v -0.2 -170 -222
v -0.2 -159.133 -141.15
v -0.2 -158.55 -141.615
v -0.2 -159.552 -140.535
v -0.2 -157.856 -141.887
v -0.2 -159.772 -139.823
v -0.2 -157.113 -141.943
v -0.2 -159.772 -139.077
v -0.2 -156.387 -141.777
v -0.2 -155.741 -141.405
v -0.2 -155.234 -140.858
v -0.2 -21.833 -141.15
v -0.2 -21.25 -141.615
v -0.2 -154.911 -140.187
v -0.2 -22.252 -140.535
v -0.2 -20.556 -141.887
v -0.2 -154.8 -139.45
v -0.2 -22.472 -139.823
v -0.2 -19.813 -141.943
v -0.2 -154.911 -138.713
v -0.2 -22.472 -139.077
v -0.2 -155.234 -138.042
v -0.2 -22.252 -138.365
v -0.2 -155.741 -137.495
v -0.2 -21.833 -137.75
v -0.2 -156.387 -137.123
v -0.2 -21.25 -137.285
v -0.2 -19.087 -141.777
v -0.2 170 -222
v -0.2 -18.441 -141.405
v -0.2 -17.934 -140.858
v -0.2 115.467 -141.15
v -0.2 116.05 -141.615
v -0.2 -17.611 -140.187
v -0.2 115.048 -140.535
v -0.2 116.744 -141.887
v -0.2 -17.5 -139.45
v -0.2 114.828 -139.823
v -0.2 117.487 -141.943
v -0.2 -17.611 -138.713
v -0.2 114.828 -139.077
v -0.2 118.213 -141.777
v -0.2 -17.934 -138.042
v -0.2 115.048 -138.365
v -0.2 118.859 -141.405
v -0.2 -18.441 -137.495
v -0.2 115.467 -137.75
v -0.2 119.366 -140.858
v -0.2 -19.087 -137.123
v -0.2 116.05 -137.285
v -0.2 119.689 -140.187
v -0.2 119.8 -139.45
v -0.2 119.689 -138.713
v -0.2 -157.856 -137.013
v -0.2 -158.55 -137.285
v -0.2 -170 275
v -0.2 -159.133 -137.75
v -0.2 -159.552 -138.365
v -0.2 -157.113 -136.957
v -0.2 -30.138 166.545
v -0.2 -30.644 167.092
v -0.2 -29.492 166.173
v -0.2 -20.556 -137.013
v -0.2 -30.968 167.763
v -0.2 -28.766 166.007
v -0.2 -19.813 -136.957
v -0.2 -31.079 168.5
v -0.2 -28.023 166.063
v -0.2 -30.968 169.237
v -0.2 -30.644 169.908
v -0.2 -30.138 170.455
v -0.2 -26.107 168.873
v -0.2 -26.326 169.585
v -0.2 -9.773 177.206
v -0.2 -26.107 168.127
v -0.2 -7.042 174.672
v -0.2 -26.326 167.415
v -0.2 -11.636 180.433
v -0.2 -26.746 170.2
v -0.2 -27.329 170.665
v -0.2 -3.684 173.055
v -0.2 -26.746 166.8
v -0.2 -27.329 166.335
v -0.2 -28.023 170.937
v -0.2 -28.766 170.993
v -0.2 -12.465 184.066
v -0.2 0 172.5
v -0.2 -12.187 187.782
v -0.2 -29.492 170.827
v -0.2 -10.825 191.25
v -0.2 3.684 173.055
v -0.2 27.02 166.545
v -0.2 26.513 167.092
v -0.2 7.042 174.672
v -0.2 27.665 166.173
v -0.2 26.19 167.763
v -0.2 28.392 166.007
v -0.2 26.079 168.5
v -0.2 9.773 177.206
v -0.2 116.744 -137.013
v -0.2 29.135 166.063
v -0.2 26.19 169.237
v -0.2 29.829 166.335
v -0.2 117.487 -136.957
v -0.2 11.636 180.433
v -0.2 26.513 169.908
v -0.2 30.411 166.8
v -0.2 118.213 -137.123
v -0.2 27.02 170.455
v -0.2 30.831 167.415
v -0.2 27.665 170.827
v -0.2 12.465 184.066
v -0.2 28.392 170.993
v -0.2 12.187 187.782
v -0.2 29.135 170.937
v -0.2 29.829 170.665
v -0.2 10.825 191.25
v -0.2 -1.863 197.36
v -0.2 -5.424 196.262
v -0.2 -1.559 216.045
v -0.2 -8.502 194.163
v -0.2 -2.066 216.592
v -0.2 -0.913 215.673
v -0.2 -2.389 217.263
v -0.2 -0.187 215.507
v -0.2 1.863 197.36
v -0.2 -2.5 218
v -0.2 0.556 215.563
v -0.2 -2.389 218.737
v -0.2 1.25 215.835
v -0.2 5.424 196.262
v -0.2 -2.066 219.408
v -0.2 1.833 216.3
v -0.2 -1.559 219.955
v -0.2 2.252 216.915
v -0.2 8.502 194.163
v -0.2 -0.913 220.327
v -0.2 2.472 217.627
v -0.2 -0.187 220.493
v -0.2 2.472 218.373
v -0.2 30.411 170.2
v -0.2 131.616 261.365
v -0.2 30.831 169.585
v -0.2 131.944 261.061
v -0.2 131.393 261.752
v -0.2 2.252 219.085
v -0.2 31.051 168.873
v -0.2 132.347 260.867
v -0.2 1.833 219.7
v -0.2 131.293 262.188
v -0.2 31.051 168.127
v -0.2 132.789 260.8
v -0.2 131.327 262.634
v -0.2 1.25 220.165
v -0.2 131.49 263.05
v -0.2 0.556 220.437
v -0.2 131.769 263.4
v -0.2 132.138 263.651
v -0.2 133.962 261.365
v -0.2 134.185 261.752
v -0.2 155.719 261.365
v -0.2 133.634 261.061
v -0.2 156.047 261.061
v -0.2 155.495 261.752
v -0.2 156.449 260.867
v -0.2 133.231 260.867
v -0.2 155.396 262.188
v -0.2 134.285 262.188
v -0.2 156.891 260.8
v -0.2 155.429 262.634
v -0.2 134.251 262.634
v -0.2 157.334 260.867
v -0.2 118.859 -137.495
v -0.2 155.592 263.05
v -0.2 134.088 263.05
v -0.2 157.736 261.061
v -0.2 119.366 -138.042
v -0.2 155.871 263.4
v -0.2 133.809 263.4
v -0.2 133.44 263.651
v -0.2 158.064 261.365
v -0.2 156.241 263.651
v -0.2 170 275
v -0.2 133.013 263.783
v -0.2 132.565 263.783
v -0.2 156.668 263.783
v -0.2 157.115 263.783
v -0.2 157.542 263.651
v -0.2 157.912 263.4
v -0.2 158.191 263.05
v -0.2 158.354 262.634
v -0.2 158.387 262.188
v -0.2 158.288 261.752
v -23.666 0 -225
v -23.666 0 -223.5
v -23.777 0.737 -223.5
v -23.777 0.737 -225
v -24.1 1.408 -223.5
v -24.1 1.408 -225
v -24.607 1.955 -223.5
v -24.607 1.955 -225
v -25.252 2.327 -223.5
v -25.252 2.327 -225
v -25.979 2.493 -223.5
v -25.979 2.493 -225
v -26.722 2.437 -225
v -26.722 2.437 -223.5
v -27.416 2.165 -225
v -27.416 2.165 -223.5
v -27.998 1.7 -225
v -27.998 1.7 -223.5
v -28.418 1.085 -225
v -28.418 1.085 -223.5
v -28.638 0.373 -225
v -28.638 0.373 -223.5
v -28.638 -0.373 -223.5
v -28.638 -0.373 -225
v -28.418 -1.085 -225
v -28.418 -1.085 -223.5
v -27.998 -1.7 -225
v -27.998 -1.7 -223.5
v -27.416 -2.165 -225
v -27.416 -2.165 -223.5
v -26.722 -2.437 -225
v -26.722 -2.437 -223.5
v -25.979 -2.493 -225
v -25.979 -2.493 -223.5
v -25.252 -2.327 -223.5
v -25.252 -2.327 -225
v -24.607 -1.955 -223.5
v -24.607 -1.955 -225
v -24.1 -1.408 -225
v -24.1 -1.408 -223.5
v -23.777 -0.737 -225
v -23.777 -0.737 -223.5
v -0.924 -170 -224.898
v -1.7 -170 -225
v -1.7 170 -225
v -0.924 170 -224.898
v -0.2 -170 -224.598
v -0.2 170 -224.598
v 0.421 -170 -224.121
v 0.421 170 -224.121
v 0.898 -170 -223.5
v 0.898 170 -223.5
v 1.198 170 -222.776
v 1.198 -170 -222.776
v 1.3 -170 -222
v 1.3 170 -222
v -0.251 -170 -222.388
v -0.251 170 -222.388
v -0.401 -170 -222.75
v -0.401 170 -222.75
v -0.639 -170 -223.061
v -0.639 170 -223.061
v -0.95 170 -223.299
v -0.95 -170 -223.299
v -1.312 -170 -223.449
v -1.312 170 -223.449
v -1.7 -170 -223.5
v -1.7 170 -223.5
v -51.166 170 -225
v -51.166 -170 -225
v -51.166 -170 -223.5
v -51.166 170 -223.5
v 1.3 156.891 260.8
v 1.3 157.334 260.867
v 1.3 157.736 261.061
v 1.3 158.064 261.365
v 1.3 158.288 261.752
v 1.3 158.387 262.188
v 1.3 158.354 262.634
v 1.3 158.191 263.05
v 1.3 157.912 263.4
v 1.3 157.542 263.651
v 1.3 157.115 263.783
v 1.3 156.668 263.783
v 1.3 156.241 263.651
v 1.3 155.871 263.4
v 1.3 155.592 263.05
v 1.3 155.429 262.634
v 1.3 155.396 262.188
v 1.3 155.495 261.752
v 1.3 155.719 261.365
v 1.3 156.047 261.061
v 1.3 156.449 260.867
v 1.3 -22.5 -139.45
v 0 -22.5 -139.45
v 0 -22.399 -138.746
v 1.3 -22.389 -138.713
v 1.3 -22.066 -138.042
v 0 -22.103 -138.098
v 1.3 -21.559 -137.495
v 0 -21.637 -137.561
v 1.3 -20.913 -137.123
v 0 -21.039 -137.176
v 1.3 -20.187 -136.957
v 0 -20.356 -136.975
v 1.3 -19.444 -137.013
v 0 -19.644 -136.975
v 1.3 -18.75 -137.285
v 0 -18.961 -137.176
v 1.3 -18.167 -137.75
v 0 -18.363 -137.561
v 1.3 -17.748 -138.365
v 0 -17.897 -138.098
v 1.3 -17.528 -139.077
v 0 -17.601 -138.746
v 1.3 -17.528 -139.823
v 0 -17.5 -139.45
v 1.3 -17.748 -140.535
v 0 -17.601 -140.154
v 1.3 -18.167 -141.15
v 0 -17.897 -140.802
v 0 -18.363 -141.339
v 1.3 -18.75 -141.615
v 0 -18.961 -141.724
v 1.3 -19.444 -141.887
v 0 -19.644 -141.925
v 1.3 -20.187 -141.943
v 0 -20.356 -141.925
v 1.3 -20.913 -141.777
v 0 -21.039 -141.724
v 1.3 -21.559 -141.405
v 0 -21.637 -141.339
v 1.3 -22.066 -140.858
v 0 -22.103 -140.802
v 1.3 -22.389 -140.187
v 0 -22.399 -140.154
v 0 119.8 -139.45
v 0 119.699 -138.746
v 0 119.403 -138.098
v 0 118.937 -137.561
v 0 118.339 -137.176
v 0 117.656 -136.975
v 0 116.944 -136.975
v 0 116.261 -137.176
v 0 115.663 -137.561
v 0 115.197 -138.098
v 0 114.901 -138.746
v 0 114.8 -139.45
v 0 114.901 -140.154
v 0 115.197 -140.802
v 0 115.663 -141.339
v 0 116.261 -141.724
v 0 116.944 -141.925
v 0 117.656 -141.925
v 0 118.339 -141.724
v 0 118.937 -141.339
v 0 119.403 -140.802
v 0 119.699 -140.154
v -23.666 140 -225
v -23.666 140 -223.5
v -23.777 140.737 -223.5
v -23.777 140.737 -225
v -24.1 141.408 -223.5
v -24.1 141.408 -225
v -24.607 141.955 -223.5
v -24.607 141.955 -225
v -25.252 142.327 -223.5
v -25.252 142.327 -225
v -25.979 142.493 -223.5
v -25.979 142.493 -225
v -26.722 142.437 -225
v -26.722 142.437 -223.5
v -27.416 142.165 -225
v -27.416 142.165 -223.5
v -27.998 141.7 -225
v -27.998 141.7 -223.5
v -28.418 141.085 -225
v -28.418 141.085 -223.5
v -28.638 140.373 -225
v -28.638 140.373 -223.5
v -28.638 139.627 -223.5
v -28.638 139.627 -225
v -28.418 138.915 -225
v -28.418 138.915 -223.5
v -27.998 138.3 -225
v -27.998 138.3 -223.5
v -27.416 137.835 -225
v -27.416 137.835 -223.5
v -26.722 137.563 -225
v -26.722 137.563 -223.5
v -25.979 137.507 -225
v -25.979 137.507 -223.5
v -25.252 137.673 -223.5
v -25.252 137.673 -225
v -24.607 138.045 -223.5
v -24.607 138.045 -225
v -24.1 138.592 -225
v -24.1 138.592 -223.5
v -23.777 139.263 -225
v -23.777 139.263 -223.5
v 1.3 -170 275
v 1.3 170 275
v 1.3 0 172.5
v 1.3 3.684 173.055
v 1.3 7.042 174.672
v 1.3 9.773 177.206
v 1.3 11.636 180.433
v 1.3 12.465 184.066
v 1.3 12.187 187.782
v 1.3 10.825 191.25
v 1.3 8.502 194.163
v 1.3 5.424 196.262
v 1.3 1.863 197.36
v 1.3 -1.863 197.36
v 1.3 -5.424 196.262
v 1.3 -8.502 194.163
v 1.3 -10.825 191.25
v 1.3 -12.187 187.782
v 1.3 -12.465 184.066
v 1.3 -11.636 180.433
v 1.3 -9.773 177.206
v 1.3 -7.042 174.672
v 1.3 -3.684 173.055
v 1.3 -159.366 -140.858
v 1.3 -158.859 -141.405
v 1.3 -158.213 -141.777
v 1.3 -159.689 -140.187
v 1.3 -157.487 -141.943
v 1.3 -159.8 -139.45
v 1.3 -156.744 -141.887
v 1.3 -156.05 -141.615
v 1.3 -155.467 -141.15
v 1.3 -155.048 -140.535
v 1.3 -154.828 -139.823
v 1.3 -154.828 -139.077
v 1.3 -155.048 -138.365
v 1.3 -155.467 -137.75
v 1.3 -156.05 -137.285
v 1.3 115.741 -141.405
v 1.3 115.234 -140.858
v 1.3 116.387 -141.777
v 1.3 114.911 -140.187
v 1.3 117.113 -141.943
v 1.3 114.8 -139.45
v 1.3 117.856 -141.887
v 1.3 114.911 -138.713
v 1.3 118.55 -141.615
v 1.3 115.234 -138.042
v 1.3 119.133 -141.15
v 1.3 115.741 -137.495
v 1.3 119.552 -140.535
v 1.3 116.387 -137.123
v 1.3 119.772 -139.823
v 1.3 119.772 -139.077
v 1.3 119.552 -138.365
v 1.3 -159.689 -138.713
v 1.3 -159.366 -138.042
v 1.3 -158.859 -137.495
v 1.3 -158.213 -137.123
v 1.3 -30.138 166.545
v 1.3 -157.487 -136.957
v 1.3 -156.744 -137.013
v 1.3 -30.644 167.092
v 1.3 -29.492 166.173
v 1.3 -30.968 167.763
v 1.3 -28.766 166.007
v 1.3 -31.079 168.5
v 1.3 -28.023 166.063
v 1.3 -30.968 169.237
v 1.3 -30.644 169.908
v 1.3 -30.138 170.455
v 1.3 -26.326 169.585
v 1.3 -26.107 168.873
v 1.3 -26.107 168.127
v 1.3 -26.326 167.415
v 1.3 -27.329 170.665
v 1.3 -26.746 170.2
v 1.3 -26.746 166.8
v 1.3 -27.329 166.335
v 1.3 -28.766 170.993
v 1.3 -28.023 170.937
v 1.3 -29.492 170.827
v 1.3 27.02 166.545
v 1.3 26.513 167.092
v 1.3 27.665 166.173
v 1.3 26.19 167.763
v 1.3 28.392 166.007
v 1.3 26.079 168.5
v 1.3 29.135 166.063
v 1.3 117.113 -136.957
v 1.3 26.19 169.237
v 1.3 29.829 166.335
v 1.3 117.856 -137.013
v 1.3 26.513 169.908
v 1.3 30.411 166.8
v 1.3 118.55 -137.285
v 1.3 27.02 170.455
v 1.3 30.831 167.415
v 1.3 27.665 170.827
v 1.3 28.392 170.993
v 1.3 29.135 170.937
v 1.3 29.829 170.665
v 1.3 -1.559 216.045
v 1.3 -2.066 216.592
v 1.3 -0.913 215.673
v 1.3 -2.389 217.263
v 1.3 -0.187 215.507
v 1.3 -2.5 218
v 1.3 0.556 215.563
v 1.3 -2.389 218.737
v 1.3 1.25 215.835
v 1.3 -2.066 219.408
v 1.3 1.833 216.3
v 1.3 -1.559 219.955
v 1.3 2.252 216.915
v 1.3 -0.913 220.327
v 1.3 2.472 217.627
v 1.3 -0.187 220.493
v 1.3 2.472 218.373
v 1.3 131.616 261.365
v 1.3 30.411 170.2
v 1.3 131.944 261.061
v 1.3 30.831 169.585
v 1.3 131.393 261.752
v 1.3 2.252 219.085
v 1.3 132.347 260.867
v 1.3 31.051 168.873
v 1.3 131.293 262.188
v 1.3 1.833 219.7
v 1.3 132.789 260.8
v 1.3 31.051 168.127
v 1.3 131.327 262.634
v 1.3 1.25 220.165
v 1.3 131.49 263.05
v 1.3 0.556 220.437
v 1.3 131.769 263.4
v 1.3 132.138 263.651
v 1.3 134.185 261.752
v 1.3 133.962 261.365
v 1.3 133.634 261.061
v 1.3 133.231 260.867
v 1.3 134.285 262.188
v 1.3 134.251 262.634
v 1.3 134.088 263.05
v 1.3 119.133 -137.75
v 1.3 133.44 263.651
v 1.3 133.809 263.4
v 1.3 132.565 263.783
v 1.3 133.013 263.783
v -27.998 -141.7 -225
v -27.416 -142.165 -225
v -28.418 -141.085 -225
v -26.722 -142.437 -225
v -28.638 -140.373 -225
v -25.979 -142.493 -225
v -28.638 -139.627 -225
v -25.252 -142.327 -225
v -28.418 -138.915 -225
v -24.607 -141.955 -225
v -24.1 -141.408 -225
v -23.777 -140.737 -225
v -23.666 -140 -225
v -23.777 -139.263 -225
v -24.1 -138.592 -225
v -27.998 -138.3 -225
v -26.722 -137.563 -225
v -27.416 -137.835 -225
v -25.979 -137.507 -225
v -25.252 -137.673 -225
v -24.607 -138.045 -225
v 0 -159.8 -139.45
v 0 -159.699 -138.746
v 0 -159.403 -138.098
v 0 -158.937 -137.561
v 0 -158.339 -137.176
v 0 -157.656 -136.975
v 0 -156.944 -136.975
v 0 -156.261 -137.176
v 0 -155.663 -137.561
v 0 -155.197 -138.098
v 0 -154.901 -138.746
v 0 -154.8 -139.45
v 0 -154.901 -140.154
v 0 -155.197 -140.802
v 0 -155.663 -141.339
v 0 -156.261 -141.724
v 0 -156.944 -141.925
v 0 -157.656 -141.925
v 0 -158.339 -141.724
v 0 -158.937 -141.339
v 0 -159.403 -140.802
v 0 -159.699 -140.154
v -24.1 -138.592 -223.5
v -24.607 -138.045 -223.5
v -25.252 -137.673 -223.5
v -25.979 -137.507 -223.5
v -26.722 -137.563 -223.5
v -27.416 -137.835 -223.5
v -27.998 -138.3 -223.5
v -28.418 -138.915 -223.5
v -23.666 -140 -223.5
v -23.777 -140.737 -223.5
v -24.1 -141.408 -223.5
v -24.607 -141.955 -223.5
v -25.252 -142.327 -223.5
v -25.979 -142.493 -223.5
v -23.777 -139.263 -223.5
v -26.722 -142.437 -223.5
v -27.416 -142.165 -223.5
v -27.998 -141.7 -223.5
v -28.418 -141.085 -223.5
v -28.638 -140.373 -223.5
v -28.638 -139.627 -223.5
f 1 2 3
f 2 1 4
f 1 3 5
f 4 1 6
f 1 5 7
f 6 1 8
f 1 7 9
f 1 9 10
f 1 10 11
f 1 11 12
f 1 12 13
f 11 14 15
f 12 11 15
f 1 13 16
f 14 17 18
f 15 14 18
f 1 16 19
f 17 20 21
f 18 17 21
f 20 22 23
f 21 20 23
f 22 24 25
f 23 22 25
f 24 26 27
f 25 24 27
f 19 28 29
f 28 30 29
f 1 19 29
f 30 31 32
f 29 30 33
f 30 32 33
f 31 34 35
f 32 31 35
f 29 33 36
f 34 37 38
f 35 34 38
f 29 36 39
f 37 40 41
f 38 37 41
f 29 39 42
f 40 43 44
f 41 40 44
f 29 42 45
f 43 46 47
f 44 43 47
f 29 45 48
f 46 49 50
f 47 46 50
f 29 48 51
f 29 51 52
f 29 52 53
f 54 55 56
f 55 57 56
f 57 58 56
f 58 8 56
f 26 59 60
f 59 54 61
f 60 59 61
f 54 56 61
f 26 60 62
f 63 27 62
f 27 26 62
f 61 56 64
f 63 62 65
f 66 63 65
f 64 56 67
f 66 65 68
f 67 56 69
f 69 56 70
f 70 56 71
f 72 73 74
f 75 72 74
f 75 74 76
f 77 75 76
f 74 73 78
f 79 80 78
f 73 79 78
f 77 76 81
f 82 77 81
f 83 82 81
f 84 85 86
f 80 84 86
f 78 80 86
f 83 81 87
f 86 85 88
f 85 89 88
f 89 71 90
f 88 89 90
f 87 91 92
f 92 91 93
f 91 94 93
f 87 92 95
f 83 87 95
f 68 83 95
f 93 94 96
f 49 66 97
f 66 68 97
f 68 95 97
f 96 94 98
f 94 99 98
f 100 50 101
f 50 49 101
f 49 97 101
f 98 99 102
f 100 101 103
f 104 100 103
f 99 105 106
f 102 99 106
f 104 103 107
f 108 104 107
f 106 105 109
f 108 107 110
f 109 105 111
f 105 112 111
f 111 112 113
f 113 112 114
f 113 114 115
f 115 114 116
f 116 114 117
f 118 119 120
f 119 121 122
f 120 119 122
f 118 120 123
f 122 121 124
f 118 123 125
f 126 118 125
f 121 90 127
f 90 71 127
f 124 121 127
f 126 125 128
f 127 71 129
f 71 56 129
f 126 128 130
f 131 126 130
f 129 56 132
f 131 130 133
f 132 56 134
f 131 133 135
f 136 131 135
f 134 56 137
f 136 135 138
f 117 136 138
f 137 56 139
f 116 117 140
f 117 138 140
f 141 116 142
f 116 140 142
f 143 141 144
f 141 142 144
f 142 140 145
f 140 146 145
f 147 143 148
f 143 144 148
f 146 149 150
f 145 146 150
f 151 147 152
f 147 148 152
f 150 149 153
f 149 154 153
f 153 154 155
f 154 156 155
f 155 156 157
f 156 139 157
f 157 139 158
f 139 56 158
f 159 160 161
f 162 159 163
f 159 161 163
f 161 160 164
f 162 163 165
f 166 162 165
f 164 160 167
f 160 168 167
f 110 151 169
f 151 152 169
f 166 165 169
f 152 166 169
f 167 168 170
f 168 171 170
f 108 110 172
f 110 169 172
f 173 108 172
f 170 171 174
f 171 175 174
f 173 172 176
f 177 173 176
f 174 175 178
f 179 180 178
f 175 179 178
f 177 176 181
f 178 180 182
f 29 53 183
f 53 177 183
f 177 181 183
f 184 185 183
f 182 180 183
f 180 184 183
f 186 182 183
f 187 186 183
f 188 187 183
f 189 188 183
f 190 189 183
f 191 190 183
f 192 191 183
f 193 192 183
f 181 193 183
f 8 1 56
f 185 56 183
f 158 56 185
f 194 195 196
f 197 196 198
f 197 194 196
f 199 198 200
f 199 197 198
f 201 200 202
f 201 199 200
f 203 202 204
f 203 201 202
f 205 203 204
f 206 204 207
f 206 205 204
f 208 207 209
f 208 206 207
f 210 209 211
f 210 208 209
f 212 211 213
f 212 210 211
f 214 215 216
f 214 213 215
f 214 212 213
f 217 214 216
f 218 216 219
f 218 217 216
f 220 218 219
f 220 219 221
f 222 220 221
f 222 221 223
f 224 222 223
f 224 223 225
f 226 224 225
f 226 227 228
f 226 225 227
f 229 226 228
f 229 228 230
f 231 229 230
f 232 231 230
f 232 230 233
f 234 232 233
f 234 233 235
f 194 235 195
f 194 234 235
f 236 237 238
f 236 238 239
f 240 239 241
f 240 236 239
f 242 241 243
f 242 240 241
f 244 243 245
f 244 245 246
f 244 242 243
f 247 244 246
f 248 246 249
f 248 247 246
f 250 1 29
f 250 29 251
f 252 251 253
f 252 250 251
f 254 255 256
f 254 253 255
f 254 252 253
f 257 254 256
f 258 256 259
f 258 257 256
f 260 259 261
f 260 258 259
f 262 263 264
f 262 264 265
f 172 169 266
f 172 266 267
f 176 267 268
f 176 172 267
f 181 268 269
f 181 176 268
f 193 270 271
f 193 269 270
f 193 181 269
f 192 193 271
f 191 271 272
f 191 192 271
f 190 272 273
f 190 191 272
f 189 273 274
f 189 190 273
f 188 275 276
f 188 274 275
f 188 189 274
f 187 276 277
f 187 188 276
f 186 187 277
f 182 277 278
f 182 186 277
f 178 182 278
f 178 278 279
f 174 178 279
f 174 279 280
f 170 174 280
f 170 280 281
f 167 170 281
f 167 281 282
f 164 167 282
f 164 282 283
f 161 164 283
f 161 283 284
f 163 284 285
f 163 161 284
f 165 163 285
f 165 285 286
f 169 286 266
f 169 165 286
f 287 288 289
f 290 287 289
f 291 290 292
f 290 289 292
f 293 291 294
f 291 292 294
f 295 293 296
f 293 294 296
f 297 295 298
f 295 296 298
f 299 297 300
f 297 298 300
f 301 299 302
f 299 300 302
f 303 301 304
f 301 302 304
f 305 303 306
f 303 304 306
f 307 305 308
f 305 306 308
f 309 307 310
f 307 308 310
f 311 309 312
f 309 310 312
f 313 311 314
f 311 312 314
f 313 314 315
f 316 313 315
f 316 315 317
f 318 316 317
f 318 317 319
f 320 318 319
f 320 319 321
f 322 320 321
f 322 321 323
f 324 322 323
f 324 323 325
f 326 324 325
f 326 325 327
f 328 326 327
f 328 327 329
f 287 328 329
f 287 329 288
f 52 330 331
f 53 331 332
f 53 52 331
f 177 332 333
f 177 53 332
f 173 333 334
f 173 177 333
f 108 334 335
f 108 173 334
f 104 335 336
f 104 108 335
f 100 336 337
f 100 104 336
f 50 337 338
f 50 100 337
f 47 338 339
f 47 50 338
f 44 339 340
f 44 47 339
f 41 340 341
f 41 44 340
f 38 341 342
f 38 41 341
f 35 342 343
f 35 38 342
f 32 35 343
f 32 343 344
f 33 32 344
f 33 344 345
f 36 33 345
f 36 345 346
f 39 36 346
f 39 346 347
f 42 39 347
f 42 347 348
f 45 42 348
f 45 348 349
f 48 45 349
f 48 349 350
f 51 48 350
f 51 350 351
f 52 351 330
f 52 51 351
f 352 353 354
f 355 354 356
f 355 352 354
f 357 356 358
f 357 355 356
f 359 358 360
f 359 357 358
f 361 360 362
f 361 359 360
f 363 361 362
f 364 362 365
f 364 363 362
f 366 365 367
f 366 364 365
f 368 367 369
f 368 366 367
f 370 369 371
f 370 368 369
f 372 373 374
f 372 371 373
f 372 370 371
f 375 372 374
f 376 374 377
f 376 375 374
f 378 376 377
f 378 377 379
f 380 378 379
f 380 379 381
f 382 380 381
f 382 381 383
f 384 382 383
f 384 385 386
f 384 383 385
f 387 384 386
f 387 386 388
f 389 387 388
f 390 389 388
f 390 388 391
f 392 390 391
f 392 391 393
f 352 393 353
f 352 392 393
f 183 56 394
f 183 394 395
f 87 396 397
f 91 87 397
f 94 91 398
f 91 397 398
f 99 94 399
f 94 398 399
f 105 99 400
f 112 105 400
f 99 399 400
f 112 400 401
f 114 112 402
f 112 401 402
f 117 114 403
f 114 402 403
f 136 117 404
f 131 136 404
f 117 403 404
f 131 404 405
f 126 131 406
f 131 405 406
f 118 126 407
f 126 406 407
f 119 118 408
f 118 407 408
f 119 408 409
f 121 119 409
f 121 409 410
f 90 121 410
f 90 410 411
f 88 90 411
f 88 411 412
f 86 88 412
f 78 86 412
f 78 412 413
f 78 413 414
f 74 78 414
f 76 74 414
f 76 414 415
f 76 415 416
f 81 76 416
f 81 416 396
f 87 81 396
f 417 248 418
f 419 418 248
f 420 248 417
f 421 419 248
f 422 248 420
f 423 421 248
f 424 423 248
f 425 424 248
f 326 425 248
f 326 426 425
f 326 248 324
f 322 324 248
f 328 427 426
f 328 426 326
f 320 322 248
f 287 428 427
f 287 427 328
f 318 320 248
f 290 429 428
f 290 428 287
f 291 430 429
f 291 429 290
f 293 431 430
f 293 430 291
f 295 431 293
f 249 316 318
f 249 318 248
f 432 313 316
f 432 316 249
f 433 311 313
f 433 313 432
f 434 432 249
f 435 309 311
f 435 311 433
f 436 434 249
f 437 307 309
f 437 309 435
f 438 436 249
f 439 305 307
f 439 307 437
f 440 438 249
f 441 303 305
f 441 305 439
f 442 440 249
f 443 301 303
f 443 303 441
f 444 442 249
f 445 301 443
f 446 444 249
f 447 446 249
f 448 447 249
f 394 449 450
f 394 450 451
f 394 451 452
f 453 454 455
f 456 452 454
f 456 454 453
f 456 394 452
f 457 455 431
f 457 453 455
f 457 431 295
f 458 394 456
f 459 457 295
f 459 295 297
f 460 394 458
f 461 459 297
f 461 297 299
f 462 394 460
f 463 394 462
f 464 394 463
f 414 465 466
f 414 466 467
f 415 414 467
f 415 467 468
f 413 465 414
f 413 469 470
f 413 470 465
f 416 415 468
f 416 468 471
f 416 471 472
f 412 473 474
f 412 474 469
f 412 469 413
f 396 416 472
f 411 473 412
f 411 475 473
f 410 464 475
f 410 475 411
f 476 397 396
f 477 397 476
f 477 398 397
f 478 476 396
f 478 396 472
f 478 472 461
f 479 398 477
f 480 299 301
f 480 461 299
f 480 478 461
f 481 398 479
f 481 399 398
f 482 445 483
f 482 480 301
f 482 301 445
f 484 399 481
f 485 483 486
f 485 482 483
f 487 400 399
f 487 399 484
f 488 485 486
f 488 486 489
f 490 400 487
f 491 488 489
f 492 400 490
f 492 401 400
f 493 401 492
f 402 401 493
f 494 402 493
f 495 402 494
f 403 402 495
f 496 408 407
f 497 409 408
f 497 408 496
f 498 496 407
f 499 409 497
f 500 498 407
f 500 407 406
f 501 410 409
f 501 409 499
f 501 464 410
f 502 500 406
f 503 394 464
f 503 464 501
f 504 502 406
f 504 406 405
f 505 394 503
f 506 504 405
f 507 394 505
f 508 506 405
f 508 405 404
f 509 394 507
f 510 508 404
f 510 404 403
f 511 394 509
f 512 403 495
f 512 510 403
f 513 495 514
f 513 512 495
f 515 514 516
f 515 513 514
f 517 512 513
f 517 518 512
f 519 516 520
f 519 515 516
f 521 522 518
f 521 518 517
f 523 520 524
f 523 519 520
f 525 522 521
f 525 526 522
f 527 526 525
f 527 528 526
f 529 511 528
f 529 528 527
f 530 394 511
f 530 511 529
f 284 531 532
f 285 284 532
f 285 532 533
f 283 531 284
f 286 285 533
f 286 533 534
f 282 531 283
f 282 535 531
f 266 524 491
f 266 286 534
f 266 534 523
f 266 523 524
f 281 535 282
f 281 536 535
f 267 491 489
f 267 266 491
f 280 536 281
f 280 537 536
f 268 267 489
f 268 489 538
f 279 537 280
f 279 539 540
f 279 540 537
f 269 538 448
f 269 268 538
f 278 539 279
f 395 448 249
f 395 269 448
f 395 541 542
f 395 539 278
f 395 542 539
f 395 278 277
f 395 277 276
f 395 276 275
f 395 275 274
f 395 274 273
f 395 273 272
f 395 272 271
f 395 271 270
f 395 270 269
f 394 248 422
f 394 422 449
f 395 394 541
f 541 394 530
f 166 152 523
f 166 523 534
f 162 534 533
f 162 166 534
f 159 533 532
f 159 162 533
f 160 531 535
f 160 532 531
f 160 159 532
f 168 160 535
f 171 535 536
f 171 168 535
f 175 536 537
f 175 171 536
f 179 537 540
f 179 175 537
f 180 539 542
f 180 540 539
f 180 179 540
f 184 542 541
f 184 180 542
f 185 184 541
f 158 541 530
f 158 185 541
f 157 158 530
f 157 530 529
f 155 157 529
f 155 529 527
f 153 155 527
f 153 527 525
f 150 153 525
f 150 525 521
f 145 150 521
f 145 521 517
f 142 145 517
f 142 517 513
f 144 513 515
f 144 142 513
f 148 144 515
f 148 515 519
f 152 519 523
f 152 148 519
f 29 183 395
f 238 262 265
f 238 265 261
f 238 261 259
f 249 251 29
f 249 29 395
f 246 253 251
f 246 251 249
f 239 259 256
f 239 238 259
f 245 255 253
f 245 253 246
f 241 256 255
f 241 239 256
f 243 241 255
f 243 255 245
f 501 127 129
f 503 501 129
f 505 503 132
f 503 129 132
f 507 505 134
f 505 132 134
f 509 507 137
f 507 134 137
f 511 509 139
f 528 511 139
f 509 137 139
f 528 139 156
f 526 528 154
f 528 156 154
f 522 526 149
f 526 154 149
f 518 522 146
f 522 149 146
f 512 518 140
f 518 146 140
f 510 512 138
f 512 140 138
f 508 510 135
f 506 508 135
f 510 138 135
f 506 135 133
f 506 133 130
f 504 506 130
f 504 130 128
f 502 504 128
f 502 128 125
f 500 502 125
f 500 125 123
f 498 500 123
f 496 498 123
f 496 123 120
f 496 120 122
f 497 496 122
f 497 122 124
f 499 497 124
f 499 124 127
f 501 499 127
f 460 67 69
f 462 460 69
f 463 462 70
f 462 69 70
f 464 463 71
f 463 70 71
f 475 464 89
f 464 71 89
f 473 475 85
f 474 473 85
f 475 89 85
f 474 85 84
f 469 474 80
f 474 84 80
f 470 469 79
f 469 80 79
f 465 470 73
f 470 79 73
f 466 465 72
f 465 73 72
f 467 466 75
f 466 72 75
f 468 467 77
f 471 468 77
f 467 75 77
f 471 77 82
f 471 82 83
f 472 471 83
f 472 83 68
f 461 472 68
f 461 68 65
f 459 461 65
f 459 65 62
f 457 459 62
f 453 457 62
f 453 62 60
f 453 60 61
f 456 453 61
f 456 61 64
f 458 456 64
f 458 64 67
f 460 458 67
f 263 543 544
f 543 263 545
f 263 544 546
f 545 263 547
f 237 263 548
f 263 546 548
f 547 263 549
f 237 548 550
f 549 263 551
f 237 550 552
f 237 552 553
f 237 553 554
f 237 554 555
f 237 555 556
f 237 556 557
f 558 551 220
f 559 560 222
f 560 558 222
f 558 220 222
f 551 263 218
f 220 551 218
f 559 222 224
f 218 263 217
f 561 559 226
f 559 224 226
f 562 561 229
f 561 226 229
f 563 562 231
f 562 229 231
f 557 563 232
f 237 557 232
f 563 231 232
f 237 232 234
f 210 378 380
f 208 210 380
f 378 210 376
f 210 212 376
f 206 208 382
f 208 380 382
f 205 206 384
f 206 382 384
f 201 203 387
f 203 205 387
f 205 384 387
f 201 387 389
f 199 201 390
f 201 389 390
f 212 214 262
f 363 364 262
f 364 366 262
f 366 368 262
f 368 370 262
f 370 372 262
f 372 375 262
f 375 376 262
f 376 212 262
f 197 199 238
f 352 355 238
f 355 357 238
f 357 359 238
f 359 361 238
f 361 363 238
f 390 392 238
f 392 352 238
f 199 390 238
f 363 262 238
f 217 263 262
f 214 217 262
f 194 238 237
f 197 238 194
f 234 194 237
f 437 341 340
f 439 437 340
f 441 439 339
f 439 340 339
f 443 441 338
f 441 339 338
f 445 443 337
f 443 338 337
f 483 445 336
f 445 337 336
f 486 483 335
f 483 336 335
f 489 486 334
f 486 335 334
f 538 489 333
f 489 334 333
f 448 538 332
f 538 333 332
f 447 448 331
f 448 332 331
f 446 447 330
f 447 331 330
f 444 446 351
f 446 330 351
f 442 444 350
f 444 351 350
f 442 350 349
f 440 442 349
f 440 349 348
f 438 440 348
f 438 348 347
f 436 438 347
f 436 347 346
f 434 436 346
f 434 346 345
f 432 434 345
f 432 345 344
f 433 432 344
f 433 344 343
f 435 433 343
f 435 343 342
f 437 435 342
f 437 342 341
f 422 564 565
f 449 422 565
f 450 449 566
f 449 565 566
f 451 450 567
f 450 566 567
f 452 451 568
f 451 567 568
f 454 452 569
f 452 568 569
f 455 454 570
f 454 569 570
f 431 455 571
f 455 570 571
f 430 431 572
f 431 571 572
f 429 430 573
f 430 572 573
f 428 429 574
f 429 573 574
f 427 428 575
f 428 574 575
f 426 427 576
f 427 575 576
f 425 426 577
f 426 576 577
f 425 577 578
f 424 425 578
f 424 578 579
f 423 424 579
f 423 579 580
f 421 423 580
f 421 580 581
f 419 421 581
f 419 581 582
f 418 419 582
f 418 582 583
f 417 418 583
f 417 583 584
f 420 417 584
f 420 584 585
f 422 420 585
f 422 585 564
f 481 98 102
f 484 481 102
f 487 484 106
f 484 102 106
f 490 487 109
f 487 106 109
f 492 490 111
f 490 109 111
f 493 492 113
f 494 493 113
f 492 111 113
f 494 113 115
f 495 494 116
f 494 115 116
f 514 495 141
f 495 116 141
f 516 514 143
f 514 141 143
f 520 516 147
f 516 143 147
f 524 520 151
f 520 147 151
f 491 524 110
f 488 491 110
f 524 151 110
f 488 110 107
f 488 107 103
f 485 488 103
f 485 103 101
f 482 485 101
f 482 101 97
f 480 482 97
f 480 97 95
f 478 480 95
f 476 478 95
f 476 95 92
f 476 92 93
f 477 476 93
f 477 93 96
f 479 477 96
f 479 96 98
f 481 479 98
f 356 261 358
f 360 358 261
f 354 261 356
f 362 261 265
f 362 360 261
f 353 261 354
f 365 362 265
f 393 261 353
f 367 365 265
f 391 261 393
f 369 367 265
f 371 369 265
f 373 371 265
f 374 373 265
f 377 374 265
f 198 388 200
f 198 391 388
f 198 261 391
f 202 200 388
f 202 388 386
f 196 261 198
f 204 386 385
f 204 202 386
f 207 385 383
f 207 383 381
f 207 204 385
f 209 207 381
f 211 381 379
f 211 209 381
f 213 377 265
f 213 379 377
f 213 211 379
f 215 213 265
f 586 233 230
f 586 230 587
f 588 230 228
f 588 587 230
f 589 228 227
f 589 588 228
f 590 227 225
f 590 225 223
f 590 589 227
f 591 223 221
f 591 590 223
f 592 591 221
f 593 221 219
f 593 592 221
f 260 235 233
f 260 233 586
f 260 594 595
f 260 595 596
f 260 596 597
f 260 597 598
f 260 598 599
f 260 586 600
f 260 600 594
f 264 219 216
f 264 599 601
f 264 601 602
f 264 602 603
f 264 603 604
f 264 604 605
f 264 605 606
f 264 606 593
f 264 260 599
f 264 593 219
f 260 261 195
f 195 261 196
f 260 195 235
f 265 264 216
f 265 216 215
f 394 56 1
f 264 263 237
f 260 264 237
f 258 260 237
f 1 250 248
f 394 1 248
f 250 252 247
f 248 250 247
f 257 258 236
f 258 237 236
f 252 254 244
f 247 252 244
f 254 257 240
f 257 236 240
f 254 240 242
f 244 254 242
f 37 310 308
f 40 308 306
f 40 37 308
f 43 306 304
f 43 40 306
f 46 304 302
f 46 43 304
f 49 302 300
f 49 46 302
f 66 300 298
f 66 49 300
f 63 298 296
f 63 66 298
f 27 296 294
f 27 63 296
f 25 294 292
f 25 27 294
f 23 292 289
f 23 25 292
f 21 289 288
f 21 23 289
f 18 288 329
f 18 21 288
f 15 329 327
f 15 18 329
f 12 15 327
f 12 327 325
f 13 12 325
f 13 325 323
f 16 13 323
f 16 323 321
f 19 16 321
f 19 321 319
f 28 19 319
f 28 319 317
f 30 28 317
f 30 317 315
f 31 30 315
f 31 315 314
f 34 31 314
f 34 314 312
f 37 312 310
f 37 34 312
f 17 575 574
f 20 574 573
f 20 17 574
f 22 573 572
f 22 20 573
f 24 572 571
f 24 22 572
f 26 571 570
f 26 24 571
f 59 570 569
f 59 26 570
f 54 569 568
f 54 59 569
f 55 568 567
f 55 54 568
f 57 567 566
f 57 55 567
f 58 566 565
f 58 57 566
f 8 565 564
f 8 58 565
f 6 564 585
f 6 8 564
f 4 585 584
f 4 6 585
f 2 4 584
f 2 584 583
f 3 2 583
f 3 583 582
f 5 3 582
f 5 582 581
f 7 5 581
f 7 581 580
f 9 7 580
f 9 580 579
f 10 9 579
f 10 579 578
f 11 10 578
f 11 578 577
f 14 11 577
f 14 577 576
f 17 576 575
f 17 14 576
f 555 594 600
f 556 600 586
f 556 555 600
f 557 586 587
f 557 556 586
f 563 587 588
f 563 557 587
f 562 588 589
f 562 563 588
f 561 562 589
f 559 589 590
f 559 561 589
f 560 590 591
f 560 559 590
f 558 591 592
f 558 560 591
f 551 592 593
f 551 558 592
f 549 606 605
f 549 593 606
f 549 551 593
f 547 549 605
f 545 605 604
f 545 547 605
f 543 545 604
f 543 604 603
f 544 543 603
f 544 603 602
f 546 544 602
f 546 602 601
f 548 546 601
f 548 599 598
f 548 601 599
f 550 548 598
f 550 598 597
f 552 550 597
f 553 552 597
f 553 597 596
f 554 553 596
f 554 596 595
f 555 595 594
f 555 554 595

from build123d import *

# Parameters (mm, degrees)
SKETCH1_W                  = 340
SKETCH1_H                  = 550
BOSS_EXTRUDE1_DEPTH        = 1.3
F_5_0_5_DIAMETER_HOLE1_D   = 5
CONVERT_SOLID1_START       = -0.2
CONVERT_SOLID1_OUTLINE_W   = 340
CONVERT_SOLID1_OUTLINE_H   = 550
CONVERT_SOLID1_OUTLINE_R   = 2.5
CONVERT_SOLID1_DEPTH       = 0.2
SKETCHED_START             = -275
SKETCHED_BEND1_OUTLINE_W   = 1.5
SKETCHED_BEND1_OUTLINE_H   = 340
SKETCHED_BEND1_DEPTH       = 50.30822
SKETCHED_START_2           = -225
SKETCHED_BEND1_2_OUTLINE_W = 50.965708265
SKETCHED_BEND1_2_OUTLINE_H = 340
SKETCHED_BEND1_2_OUTLINE_R = 2.5
SKETCHED_BEND1_2_DEPTH     = 3
SKETCHED_START_3           = -171
SKETCHED_BEND1_3_DEPTH     = 342
F_5_0_5_DIAMETER_HOLE2_D   = 5
SKETCH10_2_R               = 12.5
CUT_EXTRUDE1_DEPTH         = 328.532670956
CUT_EXTRUDE3_DEPTH         = 328.32694619
CUT_EXTRUDE3_DEPTH_BACK    = 328.32694619
SKETCH1_4_R                = 1.5


with BuildPart() as part:
    # Sketch1 → Boss-Extrude1 (new body)
    with BuildSketch(Plane.YZ):
        Rectangle(SKETCH1_W, SKETCH1_H)
    extrude(amount=BOSS_EXTRUDE1_DEPTH)

    # Ø5.0 (5) Diameter Hole1 (through all)
    with Locations(Plane.YZ.offset(1.3)):
        with Locations((-157.3, -139.45), (-20, -139.45), (117.3, -139.45), (140, -250), (0, -250), (-140, -250)):
            Hole(F_5_0_5_DIAMETER_HOLE1_D / 2)

    # Convert-Solid1: read off the stored shape, not the designer's step
    # Convert-Solid1 outline → Convert-Solid1 (add)
    with BuildSketch(Plane.YZ.offset(CONVERT_SOLID1_START)):
        Rectangle(CONVERT_SOLID1_OUTLINE_W, CONVERT_SOLID1_OUTLINE_H)
        with Locations((-140, -250)):
            Circle(CONVERT_SOLID1_OUTLINE_R, mode=Mode.SUBTRACT)
        with Locations((-157.3, -139.45)):
            Circle(CONVERT_SOLID1_OUTLINE_R, mode=Mode.SUBTRACT)
        with Locations((-20, -139.45)):
            Circle(CONVERT_SOLID1_OUTLINE_R, mode=Mode.SUBTRACT)
        with Locations((0, -250)):
            Circle(CONVERT_SOLID1_OUTLINE_R, mode=Mode.SUBTRACT)
        with Locations((140, -250)):
            Circle(CONVERT_SOLID1_OUTLINE_R, mode=Mode.SUBTRACT)
        with Locations((117.3, -139.45)):
            Circle(CONVERT_SOLID1_OUTLINE_R, mode=Mode.SUBTRACT)
    extrude(amount=CONVERT_SOLID1_DEPTH)

    # Sketched Bend1: read off the stored shape, not the designer's step
    # Sketched Bend1 outline → Sketched Bend1 (cut)
    with BuildSketch(Plane.XY.offset(SKETCHED_START)):
        with Locations((0.55, 0)):
            Rectangle(SKETCHED_BEND1_OUTLINE_W, SKETCHED_BEND1_OUTLINE_H)
    extrude(amount=SKETCHED_BEND1_DEPTH, mode=Mode.SUBTRACT)

    # Sketched Bend1 2 outline → Sketched Bend1 2 (add)
    with BuildSketch(Plane.XY.offset(SKETCHED_START_2)):
        with Locations((-25.682854133, 0)):
            Rectangle(SKETCHED_BEND1_2_OUTLINE_W, SKETCHED_BEND1_2_OUTLINE_H)
        with Locations((-26.165708265, -140)):
            Circle(SKETCHED_BEND1_2_OUTLINE_R, mode=Mode.SUBTRACT)
        with Locations((-26.165708265, 0)):
            Circle(SKETCHED_BEND1_2_OUTLINE_R, mode=Mode.SUBTRACT)
        with Locations((-26.165708265, 140)):
            Circle(SKETCHED_BEND1_2_OUTLINE_R, mode=Mode.SUBTRACT)
    extrude(amount=SKETCHED_BEND1_2_DEPTH)

    # Sketched Bend1 3 outline → Sketched Bend1 3 (cut)
    with BuildSketch(Plane(origin=(0, 0, 0), x_dir=(1, 0, 0), z_dir=(0, 1, 0)).offset(SKETCHED_START_3)):
        with BuildLine():
            ThreePointArc((-0.2, 222), (-0.639339828, 223.060660172), (-1.7, 223.5))
            Line((-1.7, 223.5), (-51.165708265, 223.5))
            Line((-51.165708265, 223.5), (-51.165708265, 222))
            Line((-51.165708265, 222), (-0.2, 222))
        make_face()
        with BuildLine():
            Line((-0.2, 225), (-1.7, 225))
            ThreePointArc((-1.7, 225), (0.421320344, 224.121320344), (1.3, 222))
            Line((1.3, 222), (1.3, 224.69178))
            Line((1.3, 224.69178), (-0.2, 224.69178))
            Line((-0.2, 224.69178), (-0.2, 225))
        make_face()
    extrude(amount=SKETCHED_BEND1_3_DEPTH, mode=Mode.SUBTRACT)

    # Ø5.0 (5) Diameter Hole2 (through all)
    with Locations(Plane.YZ.offset(1.3)):
        with Locations((-28.578838325, 168.5), (0, 218), (28.578838325, 168.5)):
            Hole(F_5_0_5_DIAMETER_HOLE2_D / 2)

    # Sketch10<2> → Cut-Extrude1 (cut, through all)
    with BuildSketch(Plane.YZ.offset(1.3)):
        with Locations(Location((0, 185, 0), (0, 0, 270))):
            Circle(SKETCH10_2_R)
    extrude(amount=-CUT_EXTRUDE1_DEPTH, mode=Mode.SUBTRACT)

    # Sketch1<4> → Cut-Extrude3 (cut, two sides: drawn at the far end of the back side and taken through both)
    with BuildSketch(Plane.YZ.offset(-CUT_EXTRUDE3_DEPTH_BACK)):
        with Locations(Location((156.891480577, 262.3, 0), (0, 0, 270))):
            Circle(SKETCH1_4_R)
        with Locations(Location((132.789034574, 262.3, 0), (0, 0, 270))):
            Circle(SKETCH1_4_R)
    extrude(amount=CUT_EXTRUDE3_DEPTH + CUT_EXTRUDE3_DEPTH_BACK, mode=Mode.SUBTRACT)


solid = part.part
